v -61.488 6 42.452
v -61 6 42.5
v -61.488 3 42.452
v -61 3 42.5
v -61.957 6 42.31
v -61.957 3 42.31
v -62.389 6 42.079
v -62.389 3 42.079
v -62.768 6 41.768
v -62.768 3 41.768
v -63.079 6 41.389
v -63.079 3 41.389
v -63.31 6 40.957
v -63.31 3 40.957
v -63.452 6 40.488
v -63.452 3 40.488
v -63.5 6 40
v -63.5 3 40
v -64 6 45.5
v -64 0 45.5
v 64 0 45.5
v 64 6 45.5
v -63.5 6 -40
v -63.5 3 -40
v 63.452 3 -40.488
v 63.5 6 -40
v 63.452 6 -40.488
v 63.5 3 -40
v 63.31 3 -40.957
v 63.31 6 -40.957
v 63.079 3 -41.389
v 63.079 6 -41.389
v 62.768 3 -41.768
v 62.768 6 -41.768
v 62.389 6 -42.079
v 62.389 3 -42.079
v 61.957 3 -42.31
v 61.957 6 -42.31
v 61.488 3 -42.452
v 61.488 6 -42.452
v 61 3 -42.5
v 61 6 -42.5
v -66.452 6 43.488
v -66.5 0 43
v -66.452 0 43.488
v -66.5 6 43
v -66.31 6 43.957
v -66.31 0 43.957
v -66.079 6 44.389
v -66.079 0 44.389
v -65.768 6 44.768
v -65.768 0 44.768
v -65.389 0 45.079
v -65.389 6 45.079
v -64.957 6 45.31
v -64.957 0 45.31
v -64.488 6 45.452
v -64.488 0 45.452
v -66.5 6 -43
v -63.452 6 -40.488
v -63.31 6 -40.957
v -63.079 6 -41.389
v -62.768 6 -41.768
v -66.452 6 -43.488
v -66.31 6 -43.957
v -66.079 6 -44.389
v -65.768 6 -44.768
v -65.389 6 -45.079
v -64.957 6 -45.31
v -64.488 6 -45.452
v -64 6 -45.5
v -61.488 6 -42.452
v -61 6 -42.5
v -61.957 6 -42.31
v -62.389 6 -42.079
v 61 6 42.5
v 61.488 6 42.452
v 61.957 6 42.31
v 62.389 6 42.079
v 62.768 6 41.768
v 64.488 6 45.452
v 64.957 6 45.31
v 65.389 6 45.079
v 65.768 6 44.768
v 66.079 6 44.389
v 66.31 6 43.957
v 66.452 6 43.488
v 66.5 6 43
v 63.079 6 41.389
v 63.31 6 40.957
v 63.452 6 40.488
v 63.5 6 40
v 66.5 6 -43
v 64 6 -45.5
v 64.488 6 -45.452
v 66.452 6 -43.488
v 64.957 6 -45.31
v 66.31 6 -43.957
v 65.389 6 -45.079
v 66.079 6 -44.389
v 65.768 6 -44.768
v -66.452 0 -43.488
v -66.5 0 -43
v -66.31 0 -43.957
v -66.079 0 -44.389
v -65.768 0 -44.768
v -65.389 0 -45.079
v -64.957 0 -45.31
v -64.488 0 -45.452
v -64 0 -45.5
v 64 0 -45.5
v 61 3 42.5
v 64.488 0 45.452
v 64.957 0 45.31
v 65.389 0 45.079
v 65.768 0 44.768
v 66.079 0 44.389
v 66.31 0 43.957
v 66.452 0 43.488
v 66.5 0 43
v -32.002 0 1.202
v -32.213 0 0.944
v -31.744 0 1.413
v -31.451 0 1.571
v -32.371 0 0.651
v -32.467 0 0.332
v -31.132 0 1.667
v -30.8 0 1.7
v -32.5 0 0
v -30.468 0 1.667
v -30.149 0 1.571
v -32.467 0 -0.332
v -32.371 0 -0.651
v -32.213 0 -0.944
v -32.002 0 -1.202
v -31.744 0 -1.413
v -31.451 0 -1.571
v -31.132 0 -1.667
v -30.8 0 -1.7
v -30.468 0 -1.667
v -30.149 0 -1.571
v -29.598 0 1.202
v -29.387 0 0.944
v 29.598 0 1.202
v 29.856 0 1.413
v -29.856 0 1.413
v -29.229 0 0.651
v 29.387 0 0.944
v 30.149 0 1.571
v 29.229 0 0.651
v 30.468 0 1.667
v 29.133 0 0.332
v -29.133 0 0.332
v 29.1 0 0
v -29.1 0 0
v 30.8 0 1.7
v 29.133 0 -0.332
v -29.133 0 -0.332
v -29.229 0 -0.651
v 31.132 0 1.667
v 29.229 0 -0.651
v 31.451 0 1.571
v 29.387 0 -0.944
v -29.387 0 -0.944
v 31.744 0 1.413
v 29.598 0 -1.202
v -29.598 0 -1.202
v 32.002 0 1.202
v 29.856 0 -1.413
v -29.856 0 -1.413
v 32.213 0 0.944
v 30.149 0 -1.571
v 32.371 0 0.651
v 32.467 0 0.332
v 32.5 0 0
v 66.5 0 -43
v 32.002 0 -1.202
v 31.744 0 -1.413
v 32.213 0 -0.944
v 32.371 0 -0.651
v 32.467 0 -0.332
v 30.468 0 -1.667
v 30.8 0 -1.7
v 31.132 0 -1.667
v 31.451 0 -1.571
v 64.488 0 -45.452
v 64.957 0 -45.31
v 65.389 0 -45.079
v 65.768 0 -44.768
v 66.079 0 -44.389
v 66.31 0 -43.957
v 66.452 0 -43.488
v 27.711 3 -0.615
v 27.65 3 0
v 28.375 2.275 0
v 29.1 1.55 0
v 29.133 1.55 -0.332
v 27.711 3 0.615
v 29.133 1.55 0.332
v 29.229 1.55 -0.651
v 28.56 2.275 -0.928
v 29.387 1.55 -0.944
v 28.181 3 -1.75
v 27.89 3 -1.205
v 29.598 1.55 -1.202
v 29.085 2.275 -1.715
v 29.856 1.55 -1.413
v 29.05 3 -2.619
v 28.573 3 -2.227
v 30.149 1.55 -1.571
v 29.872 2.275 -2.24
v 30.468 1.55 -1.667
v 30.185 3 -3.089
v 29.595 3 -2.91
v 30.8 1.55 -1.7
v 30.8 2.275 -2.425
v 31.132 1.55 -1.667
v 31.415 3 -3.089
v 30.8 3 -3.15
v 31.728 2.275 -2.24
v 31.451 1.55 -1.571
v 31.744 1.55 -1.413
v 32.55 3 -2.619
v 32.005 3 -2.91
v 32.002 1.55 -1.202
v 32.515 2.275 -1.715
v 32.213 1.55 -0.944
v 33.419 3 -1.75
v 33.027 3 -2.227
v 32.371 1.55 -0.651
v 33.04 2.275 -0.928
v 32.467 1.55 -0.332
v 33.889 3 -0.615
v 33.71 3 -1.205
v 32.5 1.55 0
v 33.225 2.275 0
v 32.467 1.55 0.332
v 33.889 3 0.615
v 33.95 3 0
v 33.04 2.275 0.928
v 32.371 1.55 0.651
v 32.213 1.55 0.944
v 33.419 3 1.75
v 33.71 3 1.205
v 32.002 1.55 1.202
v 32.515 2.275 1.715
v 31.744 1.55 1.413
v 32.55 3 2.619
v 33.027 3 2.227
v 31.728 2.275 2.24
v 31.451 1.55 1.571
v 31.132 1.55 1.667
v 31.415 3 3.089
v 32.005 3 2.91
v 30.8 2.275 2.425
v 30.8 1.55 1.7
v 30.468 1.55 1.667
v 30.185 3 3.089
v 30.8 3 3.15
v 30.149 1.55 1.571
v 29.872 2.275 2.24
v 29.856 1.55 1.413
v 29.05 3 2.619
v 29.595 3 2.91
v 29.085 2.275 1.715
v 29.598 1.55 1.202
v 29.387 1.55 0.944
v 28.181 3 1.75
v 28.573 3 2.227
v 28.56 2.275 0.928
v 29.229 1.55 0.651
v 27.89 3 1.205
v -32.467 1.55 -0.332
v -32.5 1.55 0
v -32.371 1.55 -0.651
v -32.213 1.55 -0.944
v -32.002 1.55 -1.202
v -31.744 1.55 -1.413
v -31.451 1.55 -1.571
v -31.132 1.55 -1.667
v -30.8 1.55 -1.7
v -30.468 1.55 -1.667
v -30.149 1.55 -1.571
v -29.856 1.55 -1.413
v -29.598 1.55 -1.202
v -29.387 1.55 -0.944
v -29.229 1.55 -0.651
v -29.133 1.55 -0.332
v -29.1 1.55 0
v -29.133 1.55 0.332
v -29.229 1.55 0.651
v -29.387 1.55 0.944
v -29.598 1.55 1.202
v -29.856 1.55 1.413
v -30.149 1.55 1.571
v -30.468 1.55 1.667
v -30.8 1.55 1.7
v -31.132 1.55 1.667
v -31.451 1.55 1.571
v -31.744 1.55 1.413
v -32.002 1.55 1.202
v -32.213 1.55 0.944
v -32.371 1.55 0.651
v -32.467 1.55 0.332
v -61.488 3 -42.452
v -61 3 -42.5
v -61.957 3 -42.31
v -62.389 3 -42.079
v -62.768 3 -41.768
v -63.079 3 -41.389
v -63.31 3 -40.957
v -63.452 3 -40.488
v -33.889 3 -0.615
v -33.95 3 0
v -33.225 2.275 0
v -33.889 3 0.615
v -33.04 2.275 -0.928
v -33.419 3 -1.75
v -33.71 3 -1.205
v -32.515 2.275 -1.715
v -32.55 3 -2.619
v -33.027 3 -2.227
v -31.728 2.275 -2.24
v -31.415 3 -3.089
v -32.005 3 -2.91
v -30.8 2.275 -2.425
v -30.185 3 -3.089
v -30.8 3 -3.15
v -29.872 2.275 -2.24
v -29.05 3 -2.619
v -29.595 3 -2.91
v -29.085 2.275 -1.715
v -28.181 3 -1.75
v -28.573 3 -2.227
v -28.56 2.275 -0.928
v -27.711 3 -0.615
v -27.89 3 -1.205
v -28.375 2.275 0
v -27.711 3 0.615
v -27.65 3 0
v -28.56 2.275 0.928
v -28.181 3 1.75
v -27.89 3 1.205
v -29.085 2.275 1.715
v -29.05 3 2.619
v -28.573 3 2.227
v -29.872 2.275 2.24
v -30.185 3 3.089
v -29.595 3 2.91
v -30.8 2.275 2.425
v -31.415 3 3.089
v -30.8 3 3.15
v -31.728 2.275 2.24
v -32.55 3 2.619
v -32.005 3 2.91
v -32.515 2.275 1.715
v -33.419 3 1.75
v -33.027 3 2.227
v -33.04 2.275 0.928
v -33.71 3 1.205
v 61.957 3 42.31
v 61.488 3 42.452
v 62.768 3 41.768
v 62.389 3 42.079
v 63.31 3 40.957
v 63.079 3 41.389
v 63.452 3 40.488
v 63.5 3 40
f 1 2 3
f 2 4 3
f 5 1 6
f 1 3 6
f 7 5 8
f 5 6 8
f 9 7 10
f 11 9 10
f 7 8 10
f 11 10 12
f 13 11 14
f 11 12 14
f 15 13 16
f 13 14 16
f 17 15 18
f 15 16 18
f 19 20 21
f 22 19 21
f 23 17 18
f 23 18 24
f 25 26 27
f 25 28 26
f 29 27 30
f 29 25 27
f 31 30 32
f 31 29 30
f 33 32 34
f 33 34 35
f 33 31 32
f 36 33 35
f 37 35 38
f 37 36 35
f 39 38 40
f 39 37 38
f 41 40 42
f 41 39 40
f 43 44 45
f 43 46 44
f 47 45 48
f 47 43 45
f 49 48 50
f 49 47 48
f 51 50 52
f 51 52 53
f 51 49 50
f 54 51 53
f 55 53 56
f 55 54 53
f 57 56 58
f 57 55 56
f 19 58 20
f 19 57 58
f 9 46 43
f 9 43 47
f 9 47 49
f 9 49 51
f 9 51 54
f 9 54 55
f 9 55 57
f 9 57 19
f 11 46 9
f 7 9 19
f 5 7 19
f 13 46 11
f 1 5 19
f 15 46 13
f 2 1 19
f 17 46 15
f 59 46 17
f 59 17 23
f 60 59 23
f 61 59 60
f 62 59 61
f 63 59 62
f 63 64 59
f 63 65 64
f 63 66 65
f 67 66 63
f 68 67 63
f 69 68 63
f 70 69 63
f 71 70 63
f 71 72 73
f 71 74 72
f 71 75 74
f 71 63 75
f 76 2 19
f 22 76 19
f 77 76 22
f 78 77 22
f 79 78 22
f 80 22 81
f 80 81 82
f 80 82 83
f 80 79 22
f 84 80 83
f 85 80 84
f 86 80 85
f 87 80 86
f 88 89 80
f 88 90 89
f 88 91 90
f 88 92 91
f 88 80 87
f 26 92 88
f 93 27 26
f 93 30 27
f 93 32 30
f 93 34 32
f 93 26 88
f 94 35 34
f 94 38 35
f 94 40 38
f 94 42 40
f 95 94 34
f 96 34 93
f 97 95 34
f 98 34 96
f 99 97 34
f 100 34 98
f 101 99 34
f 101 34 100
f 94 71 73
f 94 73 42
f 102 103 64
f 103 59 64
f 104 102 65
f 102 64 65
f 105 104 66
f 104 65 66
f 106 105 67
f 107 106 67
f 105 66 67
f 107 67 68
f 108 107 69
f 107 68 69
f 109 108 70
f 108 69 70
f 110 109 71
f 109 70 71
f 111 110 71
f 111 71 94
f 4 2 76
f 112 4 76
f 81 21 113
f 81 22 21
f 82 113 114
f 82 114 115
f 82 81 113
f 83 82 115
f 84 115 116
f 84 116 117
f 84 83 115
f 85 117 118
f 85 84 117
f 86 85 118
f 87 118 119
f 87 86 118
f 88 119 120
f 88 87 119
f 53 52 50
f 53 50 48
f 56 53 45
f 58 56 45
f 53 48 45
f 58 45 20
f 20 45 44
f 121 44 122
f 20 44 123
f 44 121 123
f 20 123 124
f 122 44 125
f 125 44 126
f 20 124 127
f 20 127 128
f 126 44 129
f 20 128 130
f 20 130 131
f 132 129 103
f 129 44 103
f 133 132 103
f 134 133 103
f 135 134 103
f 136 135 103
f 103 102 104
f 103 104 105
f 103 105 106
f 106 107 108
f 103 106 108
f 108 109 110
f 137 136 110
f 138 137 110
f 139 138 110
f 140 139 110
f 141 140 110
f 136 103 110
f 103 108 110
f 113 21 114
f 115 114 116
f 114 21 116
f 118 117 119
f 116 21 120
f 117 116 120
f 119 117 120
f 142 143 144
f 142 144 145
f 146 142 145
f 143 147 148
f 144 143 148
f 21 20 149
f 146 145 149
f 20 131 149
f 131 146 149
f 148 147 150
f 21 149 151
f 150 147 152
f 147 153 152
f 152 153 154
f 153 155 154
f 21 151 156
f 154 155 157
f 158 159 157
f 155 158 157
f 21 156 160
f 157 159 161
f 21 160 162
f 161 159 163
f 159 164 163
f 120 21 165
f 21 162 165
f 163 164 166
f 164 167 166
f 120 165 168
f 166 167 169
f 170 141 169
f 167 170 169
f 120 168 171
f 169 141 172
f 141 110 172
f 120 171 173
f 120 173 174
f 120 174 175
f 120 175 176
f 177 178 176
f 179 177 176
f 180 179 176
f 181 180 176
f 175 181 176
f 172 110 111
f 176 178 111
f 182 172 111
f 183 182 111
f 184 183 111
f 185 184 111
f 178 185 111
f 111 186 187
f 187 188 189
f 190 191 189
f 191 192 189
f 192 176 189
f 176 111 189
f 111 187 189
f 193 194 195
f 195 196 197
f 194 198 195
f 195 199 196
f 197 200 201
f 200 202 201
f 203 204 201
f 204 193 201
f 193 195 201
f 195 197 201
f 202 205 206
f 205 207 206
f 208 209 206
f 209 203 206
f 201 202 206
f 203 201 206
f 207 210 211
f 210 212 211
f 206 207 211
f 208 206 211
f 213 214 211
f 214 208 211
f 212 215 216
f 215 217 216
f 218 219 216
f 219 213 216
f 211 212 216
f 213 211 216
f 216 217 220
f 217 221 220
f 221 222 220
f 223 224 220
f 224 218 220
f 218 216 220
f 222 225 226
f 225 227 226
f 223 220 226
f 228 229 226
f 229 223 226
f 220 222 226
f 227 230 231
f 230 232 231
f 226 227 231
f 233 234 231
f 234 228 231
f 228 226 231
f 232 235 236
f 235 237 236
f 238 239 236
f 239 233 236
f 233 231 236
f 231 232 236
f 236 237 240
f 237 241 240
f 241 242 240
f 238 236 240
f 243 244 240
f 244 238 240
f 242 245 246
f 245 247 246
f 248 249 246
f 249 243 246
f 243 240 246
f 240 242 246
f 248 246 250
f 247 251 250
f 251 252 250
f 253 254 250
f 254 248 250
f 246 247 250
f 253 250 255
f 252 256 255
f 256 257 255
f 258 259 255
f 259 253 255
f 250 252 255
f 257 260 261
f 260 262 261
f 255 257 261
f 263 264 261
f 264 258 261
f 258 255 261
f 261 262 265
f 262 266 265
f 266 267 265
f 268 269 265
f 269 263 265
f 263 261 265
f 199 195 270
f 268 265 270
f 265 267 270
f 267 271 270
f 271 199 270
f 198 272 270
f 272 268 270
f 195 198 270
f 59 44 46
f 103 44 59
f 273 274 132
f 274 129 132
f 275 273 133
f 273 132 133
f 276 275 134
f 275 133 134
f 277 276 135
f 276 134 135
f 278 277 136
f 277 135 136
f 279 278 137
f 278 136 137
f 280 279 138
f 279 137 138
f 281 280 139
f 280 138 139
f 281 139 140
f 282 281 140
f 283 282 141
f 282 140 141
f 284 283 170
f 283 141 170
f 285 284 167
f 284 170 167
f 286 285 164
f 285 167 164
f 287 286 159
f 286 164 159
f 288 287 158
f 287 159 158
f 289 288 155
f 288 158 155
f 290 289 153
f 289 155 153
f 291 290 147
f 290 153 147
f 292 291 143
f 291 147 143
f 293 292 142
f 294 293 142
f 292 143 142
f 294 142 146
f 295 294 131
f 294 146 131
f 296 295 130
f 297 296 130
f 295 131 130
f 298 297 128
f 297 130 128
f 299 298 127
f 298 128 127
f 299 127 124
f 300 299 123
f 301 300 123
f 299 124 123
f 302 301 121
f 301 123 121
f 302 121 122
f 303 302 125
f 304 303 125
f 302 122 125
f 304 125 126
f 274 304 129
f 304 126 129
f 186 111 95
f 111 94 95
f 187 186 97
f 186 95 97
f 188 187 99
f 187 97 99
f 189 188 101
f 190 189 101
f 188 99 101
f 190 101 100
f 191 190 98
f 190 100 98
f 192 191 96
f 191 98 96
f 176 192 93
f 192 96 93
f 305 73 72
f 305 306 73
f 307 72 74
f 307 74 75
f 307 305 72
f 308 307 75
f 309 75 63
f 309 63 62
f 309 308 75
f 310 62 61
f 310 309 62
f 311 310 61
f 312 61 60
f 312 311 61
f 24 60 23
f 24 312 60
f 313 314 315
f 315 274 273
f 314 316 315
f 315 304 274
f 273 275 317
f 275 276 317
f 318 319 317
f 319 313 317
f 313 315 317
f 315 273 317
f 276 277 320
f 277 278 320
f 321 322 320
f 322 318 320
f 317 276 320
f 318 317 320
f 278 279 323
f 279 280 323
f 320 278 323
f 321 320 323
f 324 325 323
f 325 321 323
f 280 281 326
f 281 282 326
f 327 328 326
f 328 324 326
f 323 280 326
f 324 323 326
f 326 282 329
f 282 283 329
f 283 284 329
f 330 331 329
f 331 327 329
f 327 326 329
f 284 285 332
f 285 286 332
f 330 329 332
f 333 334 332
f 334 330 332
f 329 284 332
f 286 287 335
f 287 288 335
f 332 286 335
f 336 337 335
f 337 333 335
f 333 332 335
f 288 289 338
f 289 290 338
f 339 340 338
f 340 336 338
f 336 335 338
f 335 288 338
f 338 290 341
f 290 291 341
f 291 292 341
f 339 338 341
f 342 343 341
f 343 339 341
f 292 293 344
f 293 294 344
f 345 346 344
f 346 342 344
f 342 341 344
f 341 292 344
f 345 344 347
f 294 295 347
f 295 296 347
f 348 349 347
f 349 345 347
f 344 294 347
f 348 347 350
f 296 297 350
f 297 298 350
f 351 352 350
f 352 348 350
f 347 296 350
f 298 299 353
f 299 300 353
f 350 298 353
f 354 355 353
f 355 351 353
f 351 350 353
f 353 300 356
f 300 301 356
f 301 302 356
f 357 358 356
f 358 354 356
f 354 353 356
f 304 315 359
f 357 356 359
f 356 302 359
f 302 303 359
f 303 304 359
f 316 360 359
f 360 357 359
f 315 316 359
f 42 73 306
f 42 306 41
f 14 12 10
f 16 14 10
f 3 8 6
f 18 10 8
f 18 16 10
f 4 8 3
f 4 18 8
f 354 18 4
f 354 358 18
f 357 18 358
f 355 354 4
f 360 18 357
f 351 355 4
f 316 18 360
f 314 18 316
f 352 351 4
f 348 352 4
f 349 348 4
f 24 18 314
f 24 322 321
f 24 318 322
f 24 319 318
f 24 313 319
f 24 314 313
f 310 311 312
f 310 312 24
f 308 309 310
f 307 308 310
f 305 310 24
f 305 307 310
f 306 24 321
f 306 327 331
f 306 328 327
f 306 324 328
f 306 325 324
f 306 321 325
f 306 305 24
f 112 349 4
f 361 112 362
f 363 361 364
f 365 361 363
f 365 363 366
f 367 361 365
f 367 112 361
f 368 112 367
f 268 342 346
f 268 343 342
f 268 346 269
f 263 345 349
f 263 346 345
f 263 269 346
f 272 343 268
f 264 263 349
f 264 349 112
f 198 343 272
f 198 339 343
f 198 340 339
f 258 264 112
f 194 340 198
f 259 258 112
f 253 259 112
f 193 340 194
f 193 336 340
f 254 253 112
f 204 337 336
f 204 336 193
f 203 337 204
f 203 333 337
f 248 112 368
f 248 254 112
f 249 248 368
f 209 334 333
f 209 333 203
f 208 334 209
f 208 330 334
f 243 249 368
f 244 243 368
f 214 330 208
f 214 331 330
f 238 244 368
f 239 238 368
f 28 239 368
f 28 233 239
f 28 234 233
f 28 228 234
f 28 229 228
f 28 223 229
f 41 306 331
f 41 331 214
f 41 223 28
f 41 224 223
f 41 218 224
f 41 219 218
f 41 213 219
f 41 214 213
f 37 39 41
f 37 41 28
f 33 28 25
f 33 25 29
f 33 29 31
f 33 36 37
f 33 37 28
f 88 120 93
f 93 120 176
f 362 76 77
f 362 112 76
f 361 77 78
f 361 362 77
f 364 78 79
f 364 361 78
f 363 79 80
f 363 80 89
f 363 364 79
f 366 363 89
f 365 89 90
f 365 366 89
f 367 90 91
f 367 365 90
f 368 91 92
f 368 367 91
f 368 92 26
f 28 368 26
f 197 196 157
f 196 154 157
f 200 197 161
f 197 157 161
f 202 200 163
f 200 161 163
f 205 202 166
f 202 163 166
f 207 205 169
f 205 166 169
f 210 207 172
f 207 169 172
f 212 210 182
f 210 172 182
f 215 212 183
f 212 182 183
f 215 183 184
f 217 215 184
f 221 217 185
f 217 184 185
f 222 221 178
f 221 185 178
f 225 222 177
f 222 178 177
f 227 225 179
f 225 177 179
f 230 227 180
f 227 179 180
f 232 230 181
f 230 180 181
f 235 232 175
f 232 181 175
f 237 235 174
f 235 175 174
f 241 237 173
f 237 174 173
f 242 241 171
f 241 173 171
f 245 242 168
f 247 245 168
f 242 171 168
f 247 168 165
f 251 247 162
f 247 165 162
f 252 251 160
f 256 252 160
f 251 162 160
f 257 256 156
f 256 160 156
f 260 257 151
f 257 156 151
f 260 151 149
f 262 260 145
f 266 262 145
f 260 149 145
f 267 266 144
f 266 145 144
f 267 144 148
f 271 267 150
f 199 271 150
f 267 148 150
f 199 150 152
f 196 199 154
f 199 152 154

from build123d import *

# Parameters (mm, degrees)
SKETCH1_W                                       = 133
SKETCH1_H                                       = 91
BOSS_EXTRUDE1_DEPTH                             = 6
SKETCH2_W                                       = 127
SKETCH2_H                                       = 85
CUT_EXTRUDE1_DEPTH                              = 3
FILLET1_R                                       = 2.5
CSK_FOR_M3_FLAT_HEAD_MACHINE_SCREW1_D           = 3.4
CSK_FOR_M3_FLAT_HEAD_MACHINE_SCREW1_DEPTH       = 17.38
CSK_FOR_M3_FLAT_HEAD_MACHINE_SCREW1_CSINK_D     = 6.3
CSK_FOR_M3_FLAT_HEAD_MACHINE_SCREW1_CSINK_ANGLE = 90
CSK_FOR_M3_FLAT_HEAD_MACHINE_SCREW1_TIP         = 1.021463052


with BuildPart() as part:
    # Sketch1 → Boss-Extrude1 (new body)
    with BuildSketch(Plane(origin=(0, 0, 0), x_dir=(1, 0, 0), z_dir=(0, 1, 0))):
        Rectangle(SKETCH1_W, SKETCH1_H)
    extrude(amount=BOSS_EXTRUDE1_DEPTH)

    # Sketch2 → Cut-Extrude1 (cut)
    with BuildSketch(Plane(origin=(0, 6, 0), x_dir=(1, 0, 0), z_dir=(0, 1, 0))):
        Rectangle(SKETCH2_W, SKETCH2_H)
    extrude(amount=-CUT_EXTRUDE1_DEPTH, mode=Mode.SUBTRACT)

    # Fillet1
    fillet1_edges = [part.edges().sort_by_distance(p)[0] for p in [
        (63.5, 4.5, -42.5),
        (63.5, 4.5, 42.5),
        (-63.5, 4.5, 42.5),
        (-63.5, 4.5, -42.5),
        (66.5, 3, 45.5),
        (-66.5, 3, 45.5),
        (-66.5, 3, -45.5),
        (66.5, 3, -45.5),
    ]]
    fillet(fillet1_edges, radius=FILLET1_R)

    # CSK for M3 Flat Head Machine Screw1
    with Locations(Plane(origin=(0, 3, 0), x_dir=(1, 0, 0), z_dir=(0, 1, 0))):
        with Locations((-30.8, 0), (30.8, 0)):
            CounterSinkHole(CSK_FOR_M3_FLAT_HEAD_MACHINE_SCREW1_D / 2, CSK_FOR_M3_FLAT_HEAD_MACHINE_SCREW1_CSINK_D / 2, depth=CSK_FOR_M3_FLAT_HEAD_MACHINE_SCREW1_DEPTH, counter_sink_angle=CSK_FOR_M3_FLAT_HEAD_MACHINE_SCREW1_CSINK_ANGLE)
            with Locations((0, 0, -(CSK_FOR_M3_FLAT_HEAD_MACHINE_SCREW1_DEPTH + CSK_FOR_M3_FLAT_HEAD_MACHINE_SCREW1_TIP / 2))):  # 118° drill point
                Cone(0, CSK_FOR_M3_FLAT_HEAD_MACHINE_SCREW1_D / 2, CSK_FOR_M3_FLAT_HEAD_MACHINE_SCREW1_TIP, mode=Mode.SUBTRACT)


solid = part.part
